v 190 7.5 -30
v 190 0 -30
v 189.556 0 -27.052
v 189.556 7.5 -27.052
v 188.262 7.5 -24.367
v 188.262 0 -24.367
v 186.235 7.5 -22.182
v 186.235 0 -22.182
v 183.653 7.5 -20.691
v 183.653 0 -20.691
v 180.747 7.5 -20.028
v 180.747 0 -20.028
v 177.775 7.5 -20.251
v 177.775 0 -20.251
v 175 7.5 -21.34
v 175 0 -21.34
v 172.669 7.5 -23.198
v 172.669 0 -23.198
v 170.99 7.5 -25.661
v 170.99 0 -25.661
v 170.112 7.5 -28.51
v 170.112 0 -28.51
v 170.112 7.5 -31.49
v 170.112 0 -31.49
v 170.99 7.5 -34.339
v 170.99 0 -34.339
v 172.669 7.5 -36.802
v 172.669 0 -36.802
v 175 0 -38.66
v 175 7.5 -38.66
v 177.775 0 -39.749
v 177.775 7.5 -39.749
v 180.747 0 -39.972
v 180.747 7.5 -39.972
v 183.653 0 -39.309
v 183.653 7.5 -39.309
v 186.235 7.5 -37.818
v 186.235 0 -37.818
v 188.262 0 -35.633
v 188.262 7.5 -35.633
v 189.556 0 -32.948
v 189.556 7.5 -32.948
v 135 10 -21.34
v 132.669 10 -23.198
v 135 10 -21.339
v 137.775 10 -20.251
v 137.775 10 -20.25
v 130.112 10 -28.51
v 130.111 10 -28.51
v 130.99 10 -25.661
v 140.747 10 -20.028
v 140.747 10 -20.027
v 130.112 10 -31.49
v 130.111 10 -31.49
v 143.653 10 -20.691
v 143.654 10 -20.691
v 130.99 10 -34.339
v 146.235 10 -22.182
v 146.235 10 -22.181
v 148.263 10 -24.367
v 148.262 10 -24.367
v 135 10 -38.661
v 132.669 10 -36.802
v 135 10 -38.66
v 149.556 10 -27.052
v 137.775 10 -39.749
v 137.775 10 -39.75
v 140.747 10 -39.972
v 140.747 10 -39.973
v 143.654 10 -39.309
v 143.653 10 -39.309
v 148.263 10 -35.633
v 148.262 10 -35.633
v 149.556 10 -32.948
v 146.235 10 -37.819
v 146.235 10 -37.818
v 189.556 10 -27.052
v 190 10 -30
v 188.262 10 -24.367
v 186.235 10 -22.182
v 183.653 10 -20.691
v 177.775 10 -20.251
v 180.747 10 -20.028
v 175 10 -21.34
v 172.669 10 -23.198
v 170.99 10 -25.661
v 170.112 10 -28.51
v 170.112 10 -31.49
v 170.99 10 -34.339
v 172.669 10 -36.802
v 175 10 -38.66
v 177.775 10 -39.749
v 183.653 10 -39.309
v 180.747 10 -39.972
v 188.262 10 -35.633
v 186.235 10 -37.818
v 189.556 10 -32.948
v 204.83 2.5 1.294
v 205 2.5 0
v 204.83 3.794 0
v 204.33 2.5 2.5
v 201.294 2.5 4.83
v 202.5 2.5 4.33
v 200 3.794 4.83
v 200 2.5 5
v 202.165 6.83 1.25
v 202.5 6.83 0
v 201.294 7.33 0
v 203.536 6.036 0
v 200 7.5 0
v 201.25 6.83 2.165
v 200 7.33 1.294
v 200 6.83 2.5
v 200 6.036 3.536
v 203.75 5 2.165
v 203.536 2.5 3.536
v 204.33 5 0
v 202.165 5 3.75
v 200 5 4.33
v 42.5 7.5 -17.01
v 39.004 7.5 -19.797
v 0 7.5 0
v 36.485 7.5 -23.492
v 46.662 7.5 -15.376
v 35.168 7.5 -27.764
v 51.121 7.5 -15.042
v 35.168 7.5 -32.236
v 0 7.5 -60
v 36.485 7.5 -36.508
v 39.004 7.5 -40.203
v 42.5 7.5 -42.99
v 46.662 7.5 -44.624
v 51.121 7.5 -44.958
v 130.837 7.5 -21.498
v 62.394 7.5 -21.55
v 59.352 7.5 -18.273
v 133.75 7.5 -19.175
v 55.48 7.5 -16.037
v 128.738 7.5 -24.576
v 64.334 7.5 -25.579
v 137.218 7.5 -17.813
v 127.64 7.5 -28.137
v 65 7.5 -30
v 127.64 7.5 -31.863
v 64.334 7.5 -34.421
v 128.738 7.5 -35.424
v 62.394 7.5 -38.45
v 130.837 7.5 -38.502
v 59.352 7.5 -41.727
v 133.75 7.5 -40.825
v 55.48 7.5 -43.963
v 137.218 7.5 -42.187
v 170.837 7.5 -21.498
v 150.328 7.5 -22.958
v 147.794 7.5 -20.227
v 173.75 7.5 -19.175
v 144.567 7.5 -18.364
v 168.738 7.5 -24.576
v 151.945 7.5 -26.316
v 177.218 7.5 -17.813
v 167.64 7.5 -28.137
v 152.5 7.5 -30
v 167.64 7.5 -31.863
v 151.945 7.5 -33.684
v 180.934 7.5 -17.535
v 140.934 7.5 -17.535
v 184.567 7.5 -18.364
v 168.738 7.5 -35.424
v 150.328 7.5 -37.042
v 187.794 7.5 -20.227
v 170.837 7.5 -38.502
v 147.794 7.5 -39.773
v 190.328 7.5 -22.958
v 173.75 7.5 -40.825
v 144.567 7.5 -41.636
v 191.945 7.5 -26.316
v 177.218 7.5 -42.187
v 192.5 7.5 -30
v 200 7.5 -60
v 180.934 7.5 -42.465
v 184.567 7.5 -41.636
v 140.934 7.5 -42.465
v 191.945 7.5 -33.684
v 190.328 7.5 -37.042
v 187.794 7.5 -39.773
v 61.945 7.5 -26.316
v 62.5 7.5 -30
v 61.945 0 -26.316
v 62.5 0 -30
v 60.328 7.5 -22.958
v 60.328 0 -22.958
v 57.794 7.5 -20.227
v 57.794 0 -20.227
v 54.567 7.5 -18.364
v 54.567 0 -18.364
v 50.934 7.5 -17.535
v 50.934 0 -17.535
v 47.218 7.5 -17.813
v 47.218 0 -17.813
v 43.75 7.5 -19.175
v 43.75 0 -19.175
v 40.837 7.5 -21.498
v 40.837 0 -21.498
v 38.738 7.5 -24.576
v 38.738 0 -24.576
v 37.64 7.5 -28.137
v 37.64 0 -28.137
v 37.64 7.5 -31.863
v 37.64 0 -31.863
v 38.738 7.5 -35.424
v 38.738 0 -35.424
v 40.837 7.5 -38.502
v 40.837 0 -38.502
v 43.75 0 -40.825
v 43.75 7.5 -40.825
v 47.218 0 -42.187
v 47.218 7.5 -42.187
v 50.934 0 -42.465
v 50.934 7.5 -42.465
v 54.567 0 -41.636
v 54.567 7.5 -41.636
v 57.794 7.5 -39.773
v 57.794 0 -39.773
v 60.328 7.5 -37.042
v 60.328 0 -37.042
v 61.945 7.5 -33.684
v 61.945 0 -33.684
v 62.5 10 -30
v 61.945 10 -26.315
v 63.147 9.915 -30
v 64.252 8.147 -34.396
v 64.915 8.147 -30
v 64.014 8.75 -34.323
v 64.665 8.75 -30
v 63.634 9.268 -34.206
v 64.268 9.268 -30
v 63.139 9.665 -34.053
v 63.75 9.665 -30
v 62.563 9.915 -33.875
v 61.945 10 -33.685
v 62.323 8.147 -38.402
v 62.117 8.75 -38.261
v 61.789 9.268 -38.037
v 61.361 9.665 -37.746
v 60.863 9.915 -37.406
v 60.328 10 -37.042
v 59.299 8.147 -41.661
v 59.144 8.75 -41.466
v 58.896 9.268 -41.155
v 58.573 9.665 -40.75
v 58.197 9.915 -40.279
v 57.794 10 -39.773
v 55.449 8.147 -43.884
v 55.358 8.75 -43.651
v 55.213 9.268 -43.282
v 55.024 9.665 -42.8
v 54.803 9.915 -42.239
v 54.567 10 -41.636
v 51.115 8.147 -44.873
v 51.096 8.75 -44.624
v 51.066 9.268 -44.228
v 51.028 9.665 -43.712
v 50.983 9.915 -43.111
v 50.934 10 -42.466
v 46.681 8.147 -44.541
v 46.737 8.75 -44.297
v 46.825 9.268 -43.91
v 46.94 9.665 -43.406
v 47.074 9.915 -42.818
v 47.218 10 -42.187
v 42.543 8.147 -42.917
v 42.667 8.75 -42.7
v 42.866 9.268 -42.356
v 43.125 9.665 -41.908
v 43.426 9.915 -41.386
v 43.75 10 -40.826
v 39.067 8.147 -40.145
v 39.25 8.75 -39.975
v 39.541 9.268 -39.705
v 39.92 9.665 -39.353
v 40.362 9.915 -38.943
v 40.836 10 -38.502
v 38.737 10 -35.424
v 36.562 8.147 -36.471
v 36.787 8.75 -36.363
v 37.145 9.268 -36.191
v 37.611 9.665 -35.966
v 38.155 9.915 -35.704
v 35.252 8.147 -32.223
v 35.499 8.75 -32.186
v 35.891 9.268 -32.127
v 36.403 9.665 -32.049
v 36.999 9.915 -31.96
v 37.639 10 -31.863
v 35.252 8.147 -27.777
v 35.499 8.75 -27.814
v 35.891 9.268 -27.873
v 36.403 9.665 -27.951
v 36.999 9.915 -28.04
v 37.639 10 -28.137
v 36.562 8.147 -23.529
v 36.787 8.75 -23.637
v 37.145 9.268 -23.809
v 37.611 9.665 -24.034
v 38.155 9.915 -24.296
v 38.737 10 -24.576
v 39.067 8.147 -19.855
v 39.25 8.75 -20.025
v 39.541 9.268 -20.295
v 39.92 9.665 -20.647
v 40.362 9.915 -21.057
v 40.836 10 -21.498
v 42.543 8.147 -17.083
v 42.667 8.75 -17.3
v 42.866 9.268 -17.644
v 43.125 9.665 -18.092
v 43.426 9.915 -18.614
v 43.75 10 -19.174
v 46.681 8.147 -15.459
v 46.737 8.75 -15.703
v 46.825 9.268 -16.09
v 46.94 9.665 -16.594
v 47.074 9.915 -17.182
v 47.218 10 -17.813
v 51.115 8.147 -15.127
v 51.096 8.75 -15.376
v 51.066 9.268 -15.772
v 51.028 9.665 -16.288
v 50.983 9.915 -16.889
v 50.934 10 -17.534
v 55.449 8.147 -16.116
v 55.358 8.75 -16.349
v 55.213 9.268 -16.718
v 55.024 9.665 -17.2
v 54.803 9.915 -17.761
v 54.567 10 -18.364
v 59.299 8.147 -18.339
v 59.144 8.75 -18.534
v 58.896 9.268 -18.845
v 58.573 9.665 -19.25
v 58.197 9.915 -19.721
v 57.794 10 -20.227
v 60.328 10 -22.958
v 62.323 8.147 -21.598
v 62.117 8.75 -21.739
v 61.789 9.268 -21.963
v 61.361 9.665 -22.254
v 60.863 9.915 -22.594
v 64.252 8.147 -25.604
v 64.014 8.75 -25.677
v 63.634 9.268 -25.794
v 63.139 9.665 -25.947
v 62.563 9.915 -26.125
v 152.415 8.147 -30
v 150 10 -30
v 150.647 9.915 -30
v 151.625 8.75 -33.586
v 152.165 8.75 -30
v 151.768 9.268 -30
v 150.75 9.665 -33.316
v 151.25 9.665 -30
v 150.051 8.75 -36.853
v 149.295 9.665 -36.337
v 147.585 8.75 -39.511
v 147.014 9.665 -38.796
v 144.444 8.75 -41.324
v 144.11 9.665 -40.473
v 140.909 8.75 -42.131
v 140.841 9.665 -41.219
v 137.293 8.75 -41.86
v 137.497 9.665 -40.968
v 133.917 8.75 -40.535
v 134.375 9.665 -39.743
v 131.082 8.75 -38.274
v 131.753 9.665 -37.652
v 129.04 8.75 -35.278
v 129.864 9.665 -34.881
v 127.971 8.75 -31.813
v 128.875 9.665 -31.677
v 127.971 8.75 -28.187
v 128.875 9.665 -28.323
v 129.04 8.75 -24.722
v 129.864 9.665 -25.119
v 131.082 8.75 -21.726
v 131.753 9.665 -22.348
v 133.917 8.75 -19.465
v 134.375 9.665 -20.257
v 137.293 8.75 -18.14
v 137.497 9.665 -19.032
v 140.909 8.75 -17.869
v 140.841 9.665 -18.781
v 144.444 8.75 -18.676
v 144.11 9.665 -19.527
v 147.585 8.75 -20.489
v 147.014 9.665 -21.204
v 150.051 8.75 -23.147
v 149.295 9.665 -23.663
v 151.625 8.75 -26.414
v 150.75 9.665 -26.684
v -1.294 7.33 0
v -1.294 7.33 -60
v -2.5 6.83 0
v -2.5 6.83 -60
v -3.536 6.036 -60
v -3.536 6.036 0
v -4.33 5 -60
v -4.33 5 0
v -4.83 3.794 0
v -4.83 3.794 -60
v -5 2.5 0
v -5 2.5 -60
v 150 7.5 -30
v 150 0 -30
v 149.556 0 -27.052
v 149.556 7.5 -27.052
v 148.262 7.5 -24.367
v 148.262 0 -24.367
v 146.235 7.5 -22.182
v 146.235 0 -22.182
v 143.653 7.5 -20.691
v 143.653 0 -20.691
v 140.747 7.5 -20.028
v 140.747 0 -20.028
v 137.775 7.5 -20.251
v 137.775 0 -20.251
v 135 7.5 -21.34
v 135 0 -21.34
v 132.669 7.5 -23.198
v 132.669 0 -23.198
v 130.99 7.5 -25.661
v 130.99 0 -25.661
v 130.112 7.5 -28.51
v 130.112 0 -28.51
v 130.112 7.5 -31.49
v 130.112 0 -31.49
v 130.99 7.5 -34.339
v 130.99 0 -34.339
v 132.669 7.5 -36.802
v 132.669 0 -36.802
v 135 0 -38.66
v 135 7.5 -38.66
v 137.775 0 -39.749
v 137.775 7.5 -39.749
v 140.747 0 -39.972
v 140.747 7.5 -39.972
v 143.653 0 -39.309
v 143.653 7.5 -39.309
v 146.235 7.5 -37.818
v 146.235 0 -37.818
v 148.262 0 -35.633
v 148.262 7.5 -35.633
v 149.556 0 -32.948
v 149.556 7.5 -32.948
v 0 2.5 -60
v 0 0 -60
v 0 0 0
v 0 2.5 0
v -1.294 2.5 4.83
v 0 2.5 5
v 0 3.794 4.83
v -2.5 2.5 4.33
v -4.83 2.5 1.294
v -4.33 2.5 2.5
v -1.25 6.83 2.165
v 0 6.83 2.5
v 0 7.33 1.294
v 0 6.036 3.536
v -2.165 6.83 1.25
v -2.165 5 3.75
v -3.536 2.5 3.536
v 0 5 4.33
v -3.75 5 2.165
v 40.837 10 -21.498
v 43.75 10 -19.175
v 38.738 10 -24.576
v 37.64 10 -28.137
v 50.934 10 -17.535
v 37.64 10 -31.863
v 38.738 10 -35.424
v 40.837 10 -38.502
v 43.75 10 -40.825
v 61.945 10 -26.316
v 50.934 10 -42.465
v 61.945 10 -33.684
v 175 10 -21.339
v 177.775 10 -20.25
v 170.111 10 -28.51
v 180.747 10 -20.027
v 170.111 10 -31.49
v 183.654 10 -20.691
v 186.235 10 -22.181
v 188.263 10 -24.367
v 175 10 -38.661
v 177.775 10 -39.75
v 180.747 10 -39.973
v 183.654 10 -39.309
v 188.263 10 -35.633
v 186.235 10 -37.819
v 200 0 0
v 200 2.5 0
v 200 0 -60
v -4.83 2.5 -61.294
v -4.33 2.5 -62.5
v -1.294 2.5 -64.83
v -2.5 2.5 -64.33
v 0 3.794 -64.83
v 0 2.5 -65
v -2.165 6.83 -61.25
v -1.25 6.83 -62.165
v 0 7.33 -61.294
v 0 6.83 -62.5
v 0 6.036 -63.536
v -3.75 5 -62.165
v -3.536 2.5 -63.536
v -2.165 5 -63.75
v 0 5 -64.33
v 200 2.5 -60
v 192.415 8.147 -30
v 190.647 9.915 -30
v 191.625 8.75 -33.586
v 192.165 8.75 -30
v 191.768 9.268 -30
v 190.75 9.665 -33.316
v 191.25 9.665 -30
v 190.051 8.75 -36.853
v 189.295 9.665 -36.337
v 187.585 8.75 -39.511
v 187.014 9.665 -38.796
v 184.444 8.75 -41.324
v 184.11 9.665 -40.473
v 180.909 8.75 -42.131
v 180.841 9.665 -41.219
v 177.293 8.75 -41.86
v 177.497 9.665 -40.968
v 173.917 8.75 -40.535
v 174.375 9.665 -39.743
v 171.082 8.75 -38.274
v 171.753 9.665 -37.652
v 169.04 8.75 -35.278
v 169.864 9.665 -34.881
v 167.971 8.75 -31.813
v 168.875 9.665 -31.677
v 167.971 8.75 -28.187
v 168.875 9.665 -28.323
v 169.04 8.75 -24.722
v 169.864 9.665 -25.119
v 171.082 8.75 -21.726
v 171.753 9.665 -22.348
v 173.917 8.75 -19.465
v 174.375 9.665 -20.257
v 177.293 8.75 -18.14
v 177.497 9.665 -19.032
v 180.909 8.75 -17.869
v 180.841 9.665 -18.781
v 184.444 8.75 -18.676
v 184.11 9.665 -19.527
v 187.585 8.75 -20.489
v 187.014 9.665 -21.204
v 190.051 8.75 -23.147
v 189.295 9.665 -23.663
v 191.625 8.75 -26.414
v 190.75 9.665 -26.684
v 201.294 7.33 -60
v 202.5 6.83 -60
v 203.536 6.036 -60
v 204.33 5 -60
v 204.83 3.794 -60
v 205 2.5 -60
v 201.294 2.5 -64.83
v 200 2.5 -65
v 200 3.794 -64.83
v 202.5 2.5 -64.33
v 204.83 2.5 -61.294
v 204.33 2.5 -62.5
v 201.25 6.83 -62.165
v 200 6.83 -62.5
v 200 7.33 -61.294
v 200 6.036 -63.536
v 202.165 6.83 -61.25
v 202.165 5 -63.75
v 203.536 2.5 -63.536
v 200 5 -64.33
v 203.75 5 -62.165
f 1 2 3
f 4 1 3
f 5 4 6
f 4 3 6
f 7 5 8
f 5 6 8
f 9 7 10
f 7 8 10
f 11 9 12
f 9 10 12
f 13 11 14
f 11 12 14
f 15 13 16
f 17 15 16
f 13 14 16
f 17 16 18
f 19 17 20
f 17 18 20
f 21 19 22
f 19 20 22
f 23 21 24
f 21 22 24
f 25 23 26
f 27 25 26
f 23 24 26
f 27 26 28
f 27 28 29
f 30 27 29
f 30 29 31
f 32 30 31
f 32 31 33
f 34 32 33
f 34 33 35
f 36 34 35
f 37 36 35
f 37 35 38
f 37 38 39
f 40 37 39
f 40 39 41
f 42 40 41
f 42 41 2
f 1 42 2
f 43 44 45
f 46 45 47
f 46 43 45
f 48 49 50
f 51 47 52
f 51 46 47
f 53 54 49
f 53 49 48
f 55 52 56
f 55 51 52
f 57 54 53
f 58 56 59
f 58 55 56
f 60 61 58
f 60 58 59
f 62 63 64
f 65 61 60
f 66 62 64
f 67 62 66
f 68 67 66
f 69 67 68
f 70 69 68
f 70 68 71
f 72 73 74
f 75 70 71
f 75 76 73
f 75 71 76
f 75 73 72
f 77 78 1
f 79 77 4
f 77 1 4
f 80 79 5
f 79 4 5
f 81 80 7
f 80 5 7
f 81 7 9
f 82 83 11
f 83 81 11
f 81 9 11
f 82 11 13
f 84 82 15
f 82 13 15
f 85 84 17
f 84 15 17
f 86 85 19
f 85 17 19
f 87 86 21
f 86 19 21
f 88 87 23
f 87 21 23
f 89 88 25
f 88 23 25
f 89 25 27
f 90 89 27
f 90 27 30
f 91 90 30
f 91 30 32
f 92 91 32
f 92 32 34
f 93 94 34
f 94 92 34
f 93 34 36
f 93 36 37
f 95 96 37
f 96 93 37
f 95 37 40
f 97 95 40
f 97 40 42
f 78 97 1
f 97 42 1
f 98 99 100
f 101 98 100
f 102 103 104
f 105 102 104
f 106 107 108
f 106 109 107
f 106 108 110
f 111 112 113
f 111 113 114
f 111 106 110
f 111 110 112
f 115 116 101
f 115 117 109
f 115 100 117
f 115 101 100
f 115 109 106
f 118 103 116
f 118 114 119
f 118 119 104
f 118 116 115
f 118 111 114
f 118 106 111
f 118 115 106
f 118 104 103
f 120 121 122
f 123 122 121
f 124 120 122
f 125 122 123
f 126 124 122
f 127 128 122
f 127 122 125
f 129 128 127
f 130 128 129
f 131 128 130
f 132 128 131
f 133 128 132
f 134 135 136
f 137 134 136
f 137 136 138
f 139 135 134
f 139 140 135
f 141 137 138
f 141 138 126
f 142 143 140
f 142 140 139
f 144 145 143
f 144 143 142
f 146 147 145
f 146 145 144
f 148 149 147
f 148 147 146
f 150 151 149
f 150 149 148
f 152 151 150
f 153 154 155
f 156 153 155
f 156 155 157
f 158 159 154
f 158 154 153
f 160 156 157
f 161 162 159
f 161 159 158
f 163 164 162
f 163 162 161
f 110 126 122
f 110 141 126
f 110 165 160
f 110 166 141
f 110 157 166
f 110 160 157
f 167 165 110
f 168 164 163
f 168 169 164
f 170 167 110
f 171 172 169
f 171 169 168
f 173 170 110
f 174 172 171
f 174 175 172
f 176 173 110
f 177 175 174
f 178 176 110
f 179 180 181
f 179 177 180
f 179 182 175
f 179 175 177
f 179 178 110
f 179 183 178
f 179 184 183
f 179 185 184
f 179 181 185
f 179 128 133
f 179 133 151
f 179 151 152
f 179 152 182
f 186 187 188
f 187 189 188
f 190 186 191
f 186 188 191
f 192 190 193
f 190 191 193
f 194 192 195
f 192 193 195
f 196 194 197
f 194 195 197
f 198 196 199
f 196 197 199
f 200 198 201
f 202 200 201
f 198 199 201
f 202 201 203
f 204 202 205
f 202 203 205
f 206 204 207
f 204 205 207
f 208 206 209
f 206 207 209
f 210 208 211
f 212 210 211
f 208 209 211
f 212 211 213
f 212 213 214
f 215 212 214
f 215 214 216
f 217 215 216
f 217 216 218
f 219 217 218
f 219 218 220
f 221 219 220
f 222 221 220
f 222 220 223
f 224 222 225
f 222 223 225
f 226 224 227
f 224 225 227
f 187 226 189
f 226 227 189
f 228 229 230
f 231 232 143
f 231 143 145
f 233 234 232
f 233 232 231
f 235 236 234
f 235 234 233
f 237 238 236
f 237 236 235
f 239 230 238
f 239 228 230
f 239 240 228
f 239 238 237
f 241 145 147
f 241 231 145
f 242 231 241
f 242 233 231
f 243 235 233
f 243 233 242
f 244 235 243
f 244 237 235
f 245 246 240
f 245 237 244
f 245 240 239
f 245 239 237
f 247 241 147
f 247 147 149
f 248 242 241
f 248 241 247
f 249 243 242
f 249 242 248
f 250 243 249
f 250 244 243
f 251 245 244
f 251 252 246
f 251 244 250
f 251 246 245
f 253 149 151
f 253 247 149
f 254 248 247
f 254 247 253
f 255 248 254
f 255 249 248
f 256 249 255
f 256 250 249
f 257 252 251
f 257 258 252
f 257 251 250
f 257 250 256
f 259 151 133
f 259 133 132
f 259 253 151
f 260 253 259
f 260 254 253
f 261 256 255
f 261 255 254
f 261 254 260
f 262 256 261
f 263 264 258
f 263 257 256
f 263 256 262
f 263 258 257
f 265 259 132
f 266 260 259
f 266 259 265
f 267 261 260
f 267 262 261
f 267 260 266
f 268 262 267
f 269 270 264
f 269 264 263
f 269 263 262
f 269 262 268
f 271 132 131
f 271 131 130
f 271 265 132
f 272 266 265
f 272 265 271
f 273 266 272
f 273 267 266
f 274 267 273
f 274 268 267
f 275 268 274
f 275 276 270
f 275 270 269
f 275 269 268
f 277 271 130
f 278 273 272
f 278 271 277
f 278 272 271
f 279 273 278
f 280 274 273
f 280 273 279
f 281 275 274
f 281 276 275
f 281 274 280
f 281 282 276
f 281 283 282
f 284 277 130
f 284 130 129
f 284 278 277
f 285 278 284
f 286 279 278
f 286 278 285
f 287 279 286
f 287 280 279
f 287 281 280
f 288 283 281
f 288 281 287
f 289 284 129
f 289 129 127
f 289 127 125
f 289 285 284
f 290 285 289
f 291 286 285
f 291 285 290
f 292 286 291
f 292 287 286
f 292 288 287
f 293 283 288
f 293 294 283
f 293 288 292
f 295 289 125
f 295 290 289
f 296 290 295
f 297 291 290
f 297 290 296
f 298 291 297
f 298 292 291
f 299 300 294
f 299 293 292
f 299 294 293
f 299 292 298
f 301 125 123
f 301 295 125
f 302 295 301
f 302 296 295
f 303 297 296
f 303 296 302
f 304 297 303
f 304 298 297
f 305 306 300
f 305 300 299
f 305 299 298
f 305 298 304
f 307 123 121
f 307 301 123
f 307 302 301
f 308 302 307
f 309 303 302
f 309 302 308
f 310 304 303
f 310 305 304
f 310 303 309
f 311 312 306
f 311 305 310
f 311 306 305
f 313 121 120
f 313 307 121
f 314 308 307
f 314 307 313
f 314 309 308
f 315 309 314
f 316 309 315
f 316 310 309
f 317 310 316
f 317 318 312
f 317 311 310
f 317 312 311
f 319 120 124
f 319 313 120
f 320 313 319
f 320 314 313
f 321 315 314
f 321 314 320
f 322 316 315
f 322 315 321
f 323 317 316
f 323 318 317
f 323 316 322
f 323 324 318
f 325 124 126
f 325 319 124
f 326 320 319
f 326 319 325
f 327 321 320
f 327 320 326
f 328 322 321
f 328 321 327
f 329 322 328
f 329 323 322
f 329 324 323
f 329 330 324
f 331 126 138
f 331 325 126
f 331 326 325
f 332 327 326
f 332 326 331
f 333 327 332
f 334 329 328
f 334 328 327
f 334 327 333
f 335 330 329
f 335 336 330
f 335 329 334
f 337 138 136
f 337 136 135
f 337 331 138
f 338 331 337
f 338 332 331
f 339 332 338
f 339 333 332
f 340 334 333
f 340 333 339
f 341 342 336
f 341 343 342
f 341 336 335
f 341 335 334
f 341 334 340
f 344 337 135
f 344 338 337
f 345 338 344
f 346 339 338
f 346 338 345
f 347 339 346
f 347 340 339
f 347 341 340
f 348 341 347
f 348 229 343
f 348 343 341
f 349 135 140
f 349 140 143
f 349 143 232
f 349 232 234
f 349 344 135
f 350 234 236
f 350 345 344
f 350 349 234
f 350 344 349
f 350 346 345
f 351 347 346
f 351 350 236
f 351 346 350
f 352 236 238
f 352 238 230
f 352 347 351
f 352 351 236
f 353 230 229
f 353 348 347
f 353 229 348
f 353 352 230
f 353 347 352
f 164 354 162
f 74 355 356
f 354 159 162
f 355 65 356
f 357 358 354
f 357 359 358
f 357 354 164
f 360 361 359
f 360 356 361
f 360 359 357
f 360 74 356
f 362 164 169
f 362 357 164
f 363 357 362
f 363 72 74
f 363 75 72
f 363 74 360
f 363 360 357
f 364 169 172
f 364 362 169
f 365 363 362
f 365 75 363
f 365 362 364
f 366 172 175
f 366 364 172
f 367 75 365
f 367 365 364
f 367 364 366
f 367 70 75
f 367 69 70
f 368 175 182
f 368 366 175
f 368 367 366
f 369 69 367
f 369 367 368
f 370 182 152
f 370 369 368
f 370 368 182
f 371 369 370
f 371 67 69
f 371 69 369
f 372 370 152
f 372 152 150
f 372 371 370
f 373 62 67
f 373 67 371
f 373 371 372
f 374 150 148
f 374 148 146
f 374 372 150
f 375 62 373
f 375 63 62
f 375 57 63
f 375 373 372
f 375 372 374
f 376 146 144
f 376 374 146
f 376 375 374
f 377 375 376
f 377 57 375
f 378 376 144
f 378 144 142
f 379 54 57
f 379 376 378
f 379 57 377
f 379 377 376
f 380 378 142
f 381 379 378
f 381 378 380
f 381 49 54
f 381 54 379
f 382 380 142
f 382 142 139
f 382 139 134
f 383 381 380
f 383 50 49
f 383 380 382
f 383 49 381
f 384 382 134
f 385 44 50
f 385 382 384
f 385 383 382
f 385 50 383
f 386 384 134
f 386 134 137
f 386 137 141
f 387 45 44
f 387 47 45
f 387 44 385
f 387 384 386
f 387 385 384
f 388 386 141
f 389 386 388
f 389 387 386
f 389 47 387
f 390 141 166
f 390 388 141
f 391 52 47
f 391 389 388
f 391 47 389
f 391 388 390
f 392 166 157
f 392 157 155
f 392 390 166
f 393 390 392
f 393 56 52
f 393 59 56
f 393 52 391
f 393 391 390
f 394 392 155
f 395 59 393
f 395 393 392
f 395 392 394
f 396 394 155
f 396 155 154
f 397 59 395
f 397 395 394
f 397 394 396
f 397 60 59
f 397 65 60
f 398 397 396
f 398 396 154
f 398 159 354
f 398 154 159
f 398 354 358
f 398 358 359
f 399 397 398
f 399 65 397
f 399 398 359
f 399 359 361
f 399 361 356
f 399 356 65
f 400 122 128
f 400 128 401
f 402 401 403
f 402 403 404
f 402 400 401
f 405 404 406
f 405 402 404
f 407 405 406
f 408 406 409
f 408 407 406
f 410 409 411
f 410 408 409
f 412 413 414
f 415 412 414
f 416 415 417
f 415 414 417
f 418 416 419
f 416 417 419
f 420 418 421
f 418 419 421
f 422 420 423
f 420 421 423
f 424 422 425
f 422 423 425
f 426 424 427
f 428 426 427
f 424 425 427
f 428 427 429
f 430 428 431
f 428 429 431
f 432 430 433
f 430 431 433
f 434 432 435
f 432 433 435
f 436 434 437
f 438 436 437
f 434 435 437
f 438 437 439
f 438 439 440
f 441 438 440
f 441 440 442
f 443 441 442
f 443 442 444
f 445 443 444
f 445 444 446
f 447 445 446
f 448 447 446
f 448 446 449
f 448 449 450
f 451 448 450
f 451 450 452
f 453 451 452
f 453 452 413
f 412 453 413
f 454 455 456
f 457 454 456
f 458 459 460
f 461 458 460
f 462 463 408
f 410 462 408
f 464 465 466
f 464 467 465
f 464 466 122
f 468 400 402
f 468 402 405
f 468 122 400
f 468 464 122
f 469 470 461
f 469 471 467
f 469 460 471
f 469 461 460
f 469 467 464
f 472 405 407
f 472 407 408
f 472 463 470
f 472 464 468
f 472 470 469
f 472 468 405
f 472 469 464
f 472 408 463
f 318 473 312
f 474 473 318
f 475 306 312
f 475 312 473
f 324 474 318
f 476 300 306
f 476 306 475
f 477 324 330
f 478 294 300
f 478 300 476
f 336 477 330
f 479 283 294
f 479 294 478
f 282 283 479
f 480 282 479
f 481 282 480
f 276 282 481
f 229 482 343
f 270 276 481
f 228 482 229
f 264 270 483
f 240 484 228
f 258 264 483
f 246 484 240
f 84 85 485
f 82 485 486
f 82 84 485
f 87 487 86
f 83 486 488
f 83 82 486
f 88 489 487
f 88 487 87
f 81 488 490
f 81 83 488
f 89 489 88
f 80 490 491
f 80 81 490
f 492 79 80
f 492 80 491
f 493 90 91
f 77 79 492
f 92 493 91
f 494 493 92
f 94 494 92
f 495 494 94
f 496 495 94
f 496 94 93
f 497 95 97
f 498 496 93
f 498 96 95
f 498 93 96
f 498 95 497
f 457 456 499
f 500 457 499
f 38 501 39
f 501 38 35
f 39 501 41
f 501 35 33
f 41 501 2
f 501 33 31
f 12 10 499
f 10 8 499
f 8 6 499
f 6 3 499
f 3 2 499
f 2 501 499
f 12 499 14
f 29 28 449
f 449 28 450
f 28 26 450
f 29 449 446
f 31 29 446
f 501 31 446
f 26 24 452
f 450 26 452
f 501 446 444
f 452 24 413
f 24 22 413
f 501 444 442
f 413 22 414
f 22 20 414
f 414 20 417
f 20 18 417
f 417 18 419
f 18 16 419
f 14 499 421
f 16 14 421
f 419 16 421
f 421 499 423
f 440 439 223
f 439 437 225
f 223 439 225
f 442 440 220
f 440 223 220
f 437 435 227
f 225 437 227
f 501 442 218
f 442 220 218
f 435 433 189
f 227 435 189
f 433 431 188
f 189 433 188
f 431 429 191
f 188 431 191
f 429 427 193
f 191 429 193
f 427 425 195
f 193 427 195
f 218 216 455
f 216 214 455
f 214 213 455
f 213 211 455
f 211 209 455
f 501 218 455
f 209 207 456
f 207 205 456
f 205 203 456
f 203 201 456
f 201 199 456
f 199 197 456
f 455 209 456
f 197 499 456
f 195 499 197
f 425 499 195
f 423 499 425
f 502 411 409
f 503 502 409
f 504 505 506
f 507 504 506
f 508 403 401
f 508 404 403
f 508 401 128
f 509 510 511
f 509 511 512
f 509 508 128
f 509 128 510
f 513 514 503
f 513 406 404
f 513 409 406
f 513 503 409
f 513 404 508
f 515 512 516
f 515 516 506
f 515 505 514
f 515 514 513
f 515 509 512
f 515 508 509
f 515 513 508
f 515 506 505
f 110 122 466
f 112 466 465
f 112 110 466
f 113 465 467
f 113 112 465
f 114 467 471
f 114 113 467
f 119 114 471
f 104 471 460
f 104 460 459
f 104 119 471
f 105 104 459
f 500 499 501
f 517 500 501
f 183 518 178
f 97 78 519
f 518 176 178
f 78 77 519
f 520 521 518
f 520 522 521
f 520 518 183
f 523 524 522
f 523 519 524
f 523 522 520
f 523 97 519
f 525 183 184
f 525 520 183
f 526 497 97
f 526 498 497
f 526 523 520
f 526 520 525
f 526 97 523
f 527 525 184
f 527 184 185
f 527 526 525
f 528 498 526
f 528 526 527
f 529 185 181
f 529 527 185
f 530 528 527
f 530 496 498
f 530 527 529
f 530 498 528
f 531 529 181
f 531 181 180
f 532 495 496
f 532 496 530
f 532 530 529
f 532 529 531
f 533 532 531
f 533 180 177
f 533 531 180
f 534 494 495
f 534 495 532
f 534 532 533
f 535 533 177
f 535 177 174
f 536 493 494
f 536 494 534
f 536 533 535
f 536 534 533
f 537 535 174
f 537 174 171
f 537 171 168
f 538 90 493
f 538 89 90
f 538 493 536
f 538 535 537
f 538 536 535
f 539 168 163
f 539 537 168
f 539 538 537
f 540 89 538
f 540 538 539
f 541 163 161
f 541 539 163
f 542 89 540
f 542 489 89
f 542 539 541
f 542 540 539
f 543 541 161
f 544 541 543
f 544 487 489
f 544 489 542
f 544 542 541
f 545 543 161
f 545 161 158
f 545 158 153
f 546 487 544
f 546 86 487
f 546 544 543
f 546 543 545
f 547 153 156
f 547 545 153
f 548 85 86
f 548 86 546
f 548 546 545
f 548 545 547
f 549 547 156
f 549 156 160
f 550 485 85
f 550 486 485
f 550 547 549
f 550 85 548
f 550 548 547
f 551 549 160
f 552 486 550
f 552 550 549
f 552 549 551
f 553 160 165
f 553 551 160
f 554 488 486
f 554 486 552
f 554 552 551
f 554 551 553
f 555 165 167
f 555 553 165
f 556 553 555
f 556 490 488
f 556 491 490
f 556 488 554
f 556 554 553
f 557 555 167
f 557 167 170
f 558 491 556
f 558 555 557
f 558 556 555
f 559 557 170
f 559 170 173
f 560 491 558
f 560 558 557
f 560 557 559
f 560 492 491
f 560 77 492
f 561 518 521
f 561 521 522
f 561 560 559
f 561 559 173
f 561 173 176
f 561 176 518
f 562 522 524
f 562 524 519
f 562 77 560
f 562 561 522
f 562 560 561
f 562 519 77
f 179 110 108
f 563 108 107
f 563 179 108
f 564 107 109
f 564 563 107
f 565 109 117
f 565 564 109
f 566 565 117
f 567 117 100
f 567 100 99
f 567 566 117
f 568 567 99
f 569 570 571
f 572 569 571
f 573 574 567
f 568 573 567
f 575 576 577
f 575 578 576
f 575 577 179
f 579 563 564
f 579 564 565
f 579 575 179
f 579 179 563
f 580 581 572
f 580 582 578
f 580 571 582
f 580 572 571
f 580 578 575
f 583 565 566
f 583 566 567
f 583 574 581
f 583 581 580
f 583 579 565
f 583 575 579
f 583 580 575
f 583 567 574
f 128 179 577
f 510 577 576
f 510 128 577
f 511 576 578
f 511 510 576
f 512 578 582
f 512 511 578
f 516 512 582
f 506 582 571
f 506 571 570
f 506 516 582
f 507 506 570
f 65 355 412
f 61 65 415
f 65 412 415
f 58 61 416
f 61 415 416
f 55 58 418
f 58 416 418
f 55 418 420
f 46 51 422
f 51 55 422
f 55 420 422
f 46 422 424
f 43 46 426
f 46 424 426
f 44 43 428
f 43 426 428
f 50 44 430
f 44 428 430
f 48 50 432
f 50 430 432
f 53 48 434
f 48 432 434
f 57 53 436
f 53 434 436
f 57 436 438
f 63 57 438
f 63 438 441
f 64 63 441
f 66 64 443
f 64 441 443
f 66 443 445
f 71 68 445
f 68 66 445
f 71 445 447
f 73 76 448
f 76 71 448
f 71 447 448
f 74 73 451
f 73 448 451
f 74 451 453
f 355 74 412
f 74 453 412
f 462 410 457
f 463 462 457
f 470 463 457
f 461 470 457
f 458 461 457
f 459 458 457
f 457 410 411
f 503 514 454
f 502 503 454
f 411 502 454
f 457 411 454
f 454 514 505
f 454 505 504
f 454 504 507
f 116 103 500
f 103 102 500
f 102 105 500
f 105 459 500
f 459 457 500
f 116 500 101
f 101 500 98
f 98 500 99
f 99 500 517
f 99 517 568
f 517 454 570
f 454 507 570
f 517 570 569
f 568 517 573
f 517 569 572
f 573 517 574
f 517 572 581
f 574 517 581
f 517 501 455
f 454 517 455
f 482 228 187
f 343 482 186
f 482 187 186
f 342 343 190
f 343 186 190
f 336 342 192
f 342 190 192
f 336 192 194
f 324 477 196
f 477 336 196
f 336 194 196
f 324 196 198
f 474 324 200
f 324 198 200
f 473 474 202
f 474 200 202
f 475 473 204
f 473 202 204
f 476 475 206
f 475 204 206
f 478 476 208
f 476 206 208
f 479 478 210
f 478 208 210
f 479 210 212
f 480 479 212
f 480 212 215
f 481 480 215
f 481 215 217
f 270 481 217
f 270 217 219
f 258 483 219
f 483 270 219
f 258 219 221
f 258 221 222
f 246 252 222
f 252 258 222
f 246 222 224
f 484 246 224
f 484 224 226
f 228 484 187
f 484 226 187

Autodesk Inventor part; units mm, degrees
ref_plane "YZ Plane" through (0, 0, 0) normal (1, 0, 0) x (0, 1, 0)
ref_plane "XZ Plane" through (0, 0, 0) normal (0, 1, 0) x (-1, 0, 0)
ref_plane "XY Plane" through (0, 0, 0) normal (0, 0, 1) x (1, 0, 0)
sketch "Sketch1" plane through (0, 0, 0) normal (0, 1, 0) x (-1, 0, 0)
  line L0 (0, 0) -> (-200, 0)
  line L1 (-200, 0) -> (-200, -60)
  line L2 (-200, -60) -> (0, -60)
  line L3 (0, -60) -> (0, 0)
  dimension "d0" = 200
  dimension "d1" = 60
extrude "Extrusion1" add sketch "Sketch1" along normal blind 2.5
sketch "Sketch2" plane through (0, 0, 0) normal (0, -1, 0) x (1, 0, 0)
  line L0 (200, 0) -> (200, -60) projected
  line L1 (200, 0) -> (180, 0)
  line L2 (180, 0) -> (180, -30)
  line L3 (180, -30) -> (200, -30)
  line L4 (200, -30) -> (200, 0)
  circle A0 centre (180, -30) radius 10
  line L5 (0, 0) -> (200, 0) projected
  line L6 (180, -30) -> (140, -30)
  line L7 (140, -30) -> (140, 0)
  line L8 (140, 0) -> (180, 0)
  line L9 (180, 0) -> (180, -30)
  circle A1 centre (140, -30) radius 10
  dimension "d4" = 20
  dimension "d5" = 30
  dimension "d6" = 20
  dimension "d7" = 40
sketch "Sketch4" plane through (0, 2.5, 0) normal (0, 1, 0) x (1, 0, 0)
  line L0 (0, 0) -> (200, 0)
  line L1 (200, 0) -> (200, -5)
  line L2 (200, -5) -> (0, -5)
  line L3 (0, -5) -> (0, 0)
  line L4 (0, -5) -> (-5, -5)
  line L5 (-5, -5) -> (-5, 65)
  line L6 (-5, 65) -> (0, 65)
  line L7 (0, 65) -> (0, -5)
  line L8 (0, 60) -> (0, 0) projected
  line L9 (0, 0) -> (200, 0)
  line L10 (200, 0) -> (200, 65)
  line L11 (200, 65) -> (0, 65)
  line L12 (0, 65) -> (0, 0)
  line L13 (200, 65) -> (205, 65)
  line L14 (205, 65) -> (205, -5)
  line L15 (205, -5) -> (200, -5)
  line L16 (200, -5) -> (200, 65)
  dimension "d8" = 200
  dimension "d9" = 5
  dimension "d10" = 5
  dimension "d11" = 70
  dimension "d12" = 5
extrude "Extrusion2" add sketch "Sketch4" along normal blind 5
extrude "Extrusion3" cut sketch "Sketch2" against normal blind 7.5 contours A0 L6 L3 | L3 L2 A0 | L2 L6 A0 | A1 L6 L7 | L7 L6 A1
fillet "Fillet1" radius 5 4 edges at (205, 5, 5) (205, 5, -65) (-5, 5, -65) (-5, 5, 5)
fillet "Fillet2" radius 5 7 edges at (-3.5355, 7.5, 3.5355) (100, 7.5, 5) (203.5355, 7.5, 3.5355) (205, 7.5, -30) (203.5355, 7.5, -63.5355) (-3.5355, 7.5, -63.5355) (-5, 7.5, -30)
sketch "Sketch5" plane through (0, 0, 0) normal (0, -1, 0) x (1, 0, 0)
  line L0 (0, 0) -> (200, 0) projected
  line L1 (200, -60) -> (0, -60) projected
  line L2 (0, 0) -> (50, 0)
  line L3 (50, 0) -> (50, -60)
  line L4 (50, -60) -> (0, -60)
  line L5 (0, -60) -> (0, 0)
  circle A0 centre (50, -30) radius 12.5
  dimension "d19" = 50
  dimension "d20" = 25
extrude "Extrusion4" cut sketch "Sketch5" against normal blind 7.5 contours A0 L3 | L3 A0
sketch "Sketch6" plane through (0, 7.5, 0) normal (0, 1, 0) x (1, 0, 0)
  circle A0 centre (50, 30) radius 12.5 projected
  circle A1 centre (50, 30) radius 15
  circle A2 centre (140, 30) radius 10 projected
  circle A3 centre (140, 30) radius 12.5
  circle A4 centre (180, 30) radius 10 projected
  circle A5 centre (180, 30) radius 12.5
  point P0 (0, 0)
  dimension "d23" = 30
  dimension "d24" = 25
extrude "Extrusion5" add sketch "Sketch6" along normal blind 2.5
fillet "Fillet3" radius 2.5 3 edges at (127.5, 10, -30) (167.5, 10, -30) (35, 10, -30)
properties part number "Cover"
